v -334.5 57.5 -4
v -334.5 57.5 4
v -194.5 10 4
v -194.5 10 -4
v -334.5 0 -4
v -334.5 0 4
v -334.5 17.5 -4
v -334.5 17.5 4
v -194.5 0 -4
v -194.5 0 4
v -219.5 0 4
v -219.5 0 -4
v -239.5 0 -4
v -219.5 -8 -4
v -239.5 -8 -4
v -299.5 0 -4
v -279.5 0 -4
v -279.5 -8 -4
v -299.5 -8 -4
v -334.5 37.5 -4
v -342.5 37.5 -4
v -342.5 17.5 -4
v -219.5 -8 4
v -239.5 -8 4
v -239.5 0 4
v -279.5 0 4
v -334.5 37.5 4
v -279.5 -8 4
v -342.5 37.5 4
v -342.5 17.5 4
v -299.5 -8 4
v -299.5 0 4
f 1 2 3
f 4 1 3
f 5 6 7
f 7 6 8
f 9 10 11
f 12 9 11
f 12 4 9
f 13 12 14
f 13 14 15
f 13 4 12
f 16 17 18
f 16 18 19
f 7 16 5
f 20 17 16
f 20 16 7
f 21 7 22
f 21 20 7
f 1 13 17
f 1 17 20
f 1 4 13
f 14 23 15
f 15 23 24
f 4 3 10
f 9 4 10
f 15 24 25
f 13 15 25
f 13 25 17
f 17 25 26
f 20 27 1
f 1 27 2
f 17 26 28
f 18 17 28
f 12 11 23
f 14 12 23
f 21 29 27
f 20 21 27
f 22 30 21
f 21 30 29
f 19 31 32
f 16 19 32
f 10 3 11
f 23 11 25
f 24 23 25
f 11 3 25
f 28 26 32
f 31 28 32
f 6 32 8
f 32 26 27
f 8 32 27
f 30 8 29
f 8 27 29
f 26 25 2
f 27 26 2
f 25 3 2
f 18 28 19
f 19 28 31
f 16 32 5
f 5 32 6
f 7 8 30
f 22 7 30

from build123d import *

# Parameters (mm, degrees)
SKETCH1_W           = 685
SKETCH1_H           = 250
BASE_FLANGE1_DEPTH  = 8
SKETCH6_W           = 60
SKETCH6_H           = 8
SKETCH6_W_2         = 70
EXTRUDE1_DEPTH      = 8
SKETCH7_W           = 250
SKETCH7_H           = 73.5
BASE_FLANGE2_DEPTH  = 8
SKETCH12_W          = 30.5
SKETCH12_H          = 8.5
EXTRUDE2_DEPTH      = 699.681794525
SKETCH14_W          = 250
SKETCH14_H          = 8
BASE_FLANGE3_DEPTH  = 50.5
SKETCH19_W          = 60
SKETCH19_H          = 8
SKETCH19_W_2        = 70
EXTRUDE3_DEPTH      = 8
BREAK_CORNER1_START = 41.5
BREAK_CORNER1_DEPTH = 8
EXTRUDE4_DEPTH      = 8
BASE_FLANGE4_DEPTH  = 8
SKETCH38_W          = 8.5
SKETCH38_H          = 20.5
EXTRUDE5_DEPTH      = 10
SKETCH39_W          = 20.5
SKETCH39_H          = 8.5
EXTRUDE6_DEPTH      = 10


# Read off the part's stored shape, not the designer's step: Break-Corner1
# Sheet-metal steps are written as plain solids
with BuildPart() as part:
    # Sketch1 → Base-Flange1 (new body)
    with BuildSketch(Plane(origin=(0, 0, 0), x_dir=(1, 0, 0), z_dir=(0, 1, 0))):
        Rectangle(SKETCH1_W, SKETCH1_H)
    extrude(amount=-BASE_FLANGE1_DEPTH)

    # Sketch6 → Extrude1 (cut)
    with BuildSketch(Plane(origin=(342.5, 0, 0), x_dir=(0, 0, -1), z_dir=(1, 0, 0))):
        with Locations((-95, -4)):
            Rectangle(SKETCH6_W, SKETCH6_H)
        with Locations((95, -4)):
            Rectangle(SKETCH6_W, SKETCH6_H)
        with Locations((0, -4)):
            Rectangle(SKETCH6_W_2, SKETCH6_H)
    extrude1 = extrude(amount=-EXTRUDE1_DEPTH, mode=Mode.SUBTRACT)

    # Mirror1: Extrude1 across plane
    add(extrude1.mirror(Plane(origin=(0, 0, 0), x_dir=(0, 0, 1), z_dir=(1, 0, 0))), mode=Mode.SUBTRACT)

    # Sketch39 → Extrude6 (cut)
    with BuildSketch(Plane.XZ.offset(8)):
        with Locations((289.5, 0)):
            Rectangle(SKETCH39_W, SKETCH39_H)
        with Locations((229.5, 0)):
            Rectangle(SKETCH39_W, SKETCH39_H)
        with Locations((-289.5, 0)):
            Rectangle(SKETCH39_W, SKETCH39_H)
        with Locations((-229.5, 0)):
            Rectangle(SKETCH39_W, SKETCH39_H)
    extrude(amount=-EXTRUDE6_DEPTH, mode=Mode.SUBTRACT)


with BuildPart() as body_2:
    # Sketch7 → Base-Flange2 (new body)
    with BuildSketch(Plane(origin=(334.5, 0, 0), x_dir=(0, 0, -1), z_dir=(1, 0, 0))):
        with Locations((0, 20.75)):
            Rectangle(SKETCH7_W, SKETCH7_H)
    extrude(amount=BASE_FLANGE2_DEPTH)

    # Sketch12 → Extrude2 (cut, through all)
    with BuildSketch(Plane(origin=(342.5, 0, 0), x_dir=(0, 0, -1), z_dir=(1, 0, 0))):
        with Locations((-50, -4)):
            Rectangle(SKETCH12_W, SKETCH12_H)
        with Locations((50, -4)):
            Rectangle(SKETCH12_W, SKETCH12_H)
        with Locations((50, 45.5)):
            Rectangle(SKETCH12_W, SKETCH12_H)
        with Locations((-50, 45.5)):
            Rectangle(SKETCH12_W, SKETCH12_H)
    extrude(amount=-EXTRUDE2_DEPTH, mode=Mode.SUBTRACT)

    # Sketch38 → Extrude5 (cut)
    with BuildSketch(Plane(origin=(342.5, 0, 0), x_dir=(0, 0, -1), z_dir=(1, 0, 0))):
        with Locations((0, 27.5)):
            Rectangle(SKETCH38_W, SKETCH38_H)
    extrude(amount=-EXTRUDE5_DEPTH, mode=Mode.SUBTRACT)


with BuildPart() as body_3:
    # Sketch14 → Base-Flange3 (new body)
    with BuildSketch(Plane.ZY.offset(-334.5)):
        with Locations((0, 45.5)):
            Rectangle(SKETCH14_W, SKETCH14_H)
    extrude(amount=-BASE_FLANGE3_DEPTH)

    # Sketch19 → Extrude3 (cut)
    with BuildSketch(Plane(origin=(342.5, 0, 0), x_dir=(0, 0, -1), z_dir=(1, 0, 0))):
        with Locations((95, 45.5)):
            Rectangle(SKETCH19_W, SKETCH19_H)
        with Locations((0, 45.5)):
            Rectangle(SKETCH19_W_2, SKETCH19_H)
        with Locations((-95, 45.5)):
            Rectangle(SKETCH19_W, SKETCH19_H)
    extrude(amount=-EXTRUDE3_DEPTH, mode=Mode.SUBTRACT)

    # Break-Corner1 outline → Break-Corner1 (cut)
    with BuildSketch(Plane(origin=(0, 0, 0), x_dir=(1, 0, 0), z_dir=(0, 1, 0)).offset(BREAK_CORNER1_START)):
        Polygon((385, -125), (385, -110), (370, -125), align=None)
        Polygon((370, 125), (385, 110), (385, 125), align=None)
    extrude(amount=BREAK_CORNER1_DEPTH, mode=Mode.SUBTRACT)

    # Sketch20 → Extrude4 (cut)
    with BuildSketch(Plane(origin=(0, 49.5, 0), x_dir=(1, 0, 0), z_dir=(0, 1, 0))):
        with BuildLine():
            Line((367, 75), (367, 55))
            ThreePointArc((367, 55), (362.5, 50.5), (358, 55))
            Line((358, 55), (358, 75))
            ThreePointArc((358, 75), (362.5, 79.5), (367, 75))
        make_face()
        with BuildLine():
            Line((367, -75), (367, -55))
            ThreePointArc((367, -55), (362.5, -50.5), (358, -55))
            Line((358, -55), (358, -75))
            ThreePointArc((358, -75), (362.5, -79.5), (367, -75))
        make_face()
    extrude(amount=-EXTRUDE4_DEPTH, mode=Mode.SUBTRACT)


with BuildPart() as body_4:
    # Mirror4: mirrored copy
    add(body_3.part.mirror(Plane(origin=(0, 0, 0), x_dir=(0, 0, 1), z_dir=(1, 0, 0))))


with BuildPart() as body_5:
    # Sketch29 → Base-Flange4 (new body)
    with BuildSketch(Plane.XY.offset(4)):
        Polygon((219.5, 0), (219.5, -8), (239.5, -8), (239.5, 0), (279.5, 0), (279.5, -8), (299.5, -8), (299.5, 0), (334.5, 0), (334.5, 17.5), (342.5, 17.5), (342.5, 37.5), (334.5, 37.5), (334.5, 57.5), (194.5, 10), (194.5, 0), align=None)
    extrude(amount=-BASE_FLANGE4_DEPTH)


with BuildPart() as body_6:
    # Mirror5: mirrored copy
    add(body_5.part.mirror(Plane(origin=(0, 0, 0), x_dir=(0, 0, 1), z_dir=(1, 0, 0))))


with BuildPart() as body_7:
    # Mirror3: mirrored copy
    add(body_2.part.mirror(Plane(origin=(0, 0, 0), x_dir=(0, 0, 1), z_dir=(1, 0, 0))))


solid = body_6.part
